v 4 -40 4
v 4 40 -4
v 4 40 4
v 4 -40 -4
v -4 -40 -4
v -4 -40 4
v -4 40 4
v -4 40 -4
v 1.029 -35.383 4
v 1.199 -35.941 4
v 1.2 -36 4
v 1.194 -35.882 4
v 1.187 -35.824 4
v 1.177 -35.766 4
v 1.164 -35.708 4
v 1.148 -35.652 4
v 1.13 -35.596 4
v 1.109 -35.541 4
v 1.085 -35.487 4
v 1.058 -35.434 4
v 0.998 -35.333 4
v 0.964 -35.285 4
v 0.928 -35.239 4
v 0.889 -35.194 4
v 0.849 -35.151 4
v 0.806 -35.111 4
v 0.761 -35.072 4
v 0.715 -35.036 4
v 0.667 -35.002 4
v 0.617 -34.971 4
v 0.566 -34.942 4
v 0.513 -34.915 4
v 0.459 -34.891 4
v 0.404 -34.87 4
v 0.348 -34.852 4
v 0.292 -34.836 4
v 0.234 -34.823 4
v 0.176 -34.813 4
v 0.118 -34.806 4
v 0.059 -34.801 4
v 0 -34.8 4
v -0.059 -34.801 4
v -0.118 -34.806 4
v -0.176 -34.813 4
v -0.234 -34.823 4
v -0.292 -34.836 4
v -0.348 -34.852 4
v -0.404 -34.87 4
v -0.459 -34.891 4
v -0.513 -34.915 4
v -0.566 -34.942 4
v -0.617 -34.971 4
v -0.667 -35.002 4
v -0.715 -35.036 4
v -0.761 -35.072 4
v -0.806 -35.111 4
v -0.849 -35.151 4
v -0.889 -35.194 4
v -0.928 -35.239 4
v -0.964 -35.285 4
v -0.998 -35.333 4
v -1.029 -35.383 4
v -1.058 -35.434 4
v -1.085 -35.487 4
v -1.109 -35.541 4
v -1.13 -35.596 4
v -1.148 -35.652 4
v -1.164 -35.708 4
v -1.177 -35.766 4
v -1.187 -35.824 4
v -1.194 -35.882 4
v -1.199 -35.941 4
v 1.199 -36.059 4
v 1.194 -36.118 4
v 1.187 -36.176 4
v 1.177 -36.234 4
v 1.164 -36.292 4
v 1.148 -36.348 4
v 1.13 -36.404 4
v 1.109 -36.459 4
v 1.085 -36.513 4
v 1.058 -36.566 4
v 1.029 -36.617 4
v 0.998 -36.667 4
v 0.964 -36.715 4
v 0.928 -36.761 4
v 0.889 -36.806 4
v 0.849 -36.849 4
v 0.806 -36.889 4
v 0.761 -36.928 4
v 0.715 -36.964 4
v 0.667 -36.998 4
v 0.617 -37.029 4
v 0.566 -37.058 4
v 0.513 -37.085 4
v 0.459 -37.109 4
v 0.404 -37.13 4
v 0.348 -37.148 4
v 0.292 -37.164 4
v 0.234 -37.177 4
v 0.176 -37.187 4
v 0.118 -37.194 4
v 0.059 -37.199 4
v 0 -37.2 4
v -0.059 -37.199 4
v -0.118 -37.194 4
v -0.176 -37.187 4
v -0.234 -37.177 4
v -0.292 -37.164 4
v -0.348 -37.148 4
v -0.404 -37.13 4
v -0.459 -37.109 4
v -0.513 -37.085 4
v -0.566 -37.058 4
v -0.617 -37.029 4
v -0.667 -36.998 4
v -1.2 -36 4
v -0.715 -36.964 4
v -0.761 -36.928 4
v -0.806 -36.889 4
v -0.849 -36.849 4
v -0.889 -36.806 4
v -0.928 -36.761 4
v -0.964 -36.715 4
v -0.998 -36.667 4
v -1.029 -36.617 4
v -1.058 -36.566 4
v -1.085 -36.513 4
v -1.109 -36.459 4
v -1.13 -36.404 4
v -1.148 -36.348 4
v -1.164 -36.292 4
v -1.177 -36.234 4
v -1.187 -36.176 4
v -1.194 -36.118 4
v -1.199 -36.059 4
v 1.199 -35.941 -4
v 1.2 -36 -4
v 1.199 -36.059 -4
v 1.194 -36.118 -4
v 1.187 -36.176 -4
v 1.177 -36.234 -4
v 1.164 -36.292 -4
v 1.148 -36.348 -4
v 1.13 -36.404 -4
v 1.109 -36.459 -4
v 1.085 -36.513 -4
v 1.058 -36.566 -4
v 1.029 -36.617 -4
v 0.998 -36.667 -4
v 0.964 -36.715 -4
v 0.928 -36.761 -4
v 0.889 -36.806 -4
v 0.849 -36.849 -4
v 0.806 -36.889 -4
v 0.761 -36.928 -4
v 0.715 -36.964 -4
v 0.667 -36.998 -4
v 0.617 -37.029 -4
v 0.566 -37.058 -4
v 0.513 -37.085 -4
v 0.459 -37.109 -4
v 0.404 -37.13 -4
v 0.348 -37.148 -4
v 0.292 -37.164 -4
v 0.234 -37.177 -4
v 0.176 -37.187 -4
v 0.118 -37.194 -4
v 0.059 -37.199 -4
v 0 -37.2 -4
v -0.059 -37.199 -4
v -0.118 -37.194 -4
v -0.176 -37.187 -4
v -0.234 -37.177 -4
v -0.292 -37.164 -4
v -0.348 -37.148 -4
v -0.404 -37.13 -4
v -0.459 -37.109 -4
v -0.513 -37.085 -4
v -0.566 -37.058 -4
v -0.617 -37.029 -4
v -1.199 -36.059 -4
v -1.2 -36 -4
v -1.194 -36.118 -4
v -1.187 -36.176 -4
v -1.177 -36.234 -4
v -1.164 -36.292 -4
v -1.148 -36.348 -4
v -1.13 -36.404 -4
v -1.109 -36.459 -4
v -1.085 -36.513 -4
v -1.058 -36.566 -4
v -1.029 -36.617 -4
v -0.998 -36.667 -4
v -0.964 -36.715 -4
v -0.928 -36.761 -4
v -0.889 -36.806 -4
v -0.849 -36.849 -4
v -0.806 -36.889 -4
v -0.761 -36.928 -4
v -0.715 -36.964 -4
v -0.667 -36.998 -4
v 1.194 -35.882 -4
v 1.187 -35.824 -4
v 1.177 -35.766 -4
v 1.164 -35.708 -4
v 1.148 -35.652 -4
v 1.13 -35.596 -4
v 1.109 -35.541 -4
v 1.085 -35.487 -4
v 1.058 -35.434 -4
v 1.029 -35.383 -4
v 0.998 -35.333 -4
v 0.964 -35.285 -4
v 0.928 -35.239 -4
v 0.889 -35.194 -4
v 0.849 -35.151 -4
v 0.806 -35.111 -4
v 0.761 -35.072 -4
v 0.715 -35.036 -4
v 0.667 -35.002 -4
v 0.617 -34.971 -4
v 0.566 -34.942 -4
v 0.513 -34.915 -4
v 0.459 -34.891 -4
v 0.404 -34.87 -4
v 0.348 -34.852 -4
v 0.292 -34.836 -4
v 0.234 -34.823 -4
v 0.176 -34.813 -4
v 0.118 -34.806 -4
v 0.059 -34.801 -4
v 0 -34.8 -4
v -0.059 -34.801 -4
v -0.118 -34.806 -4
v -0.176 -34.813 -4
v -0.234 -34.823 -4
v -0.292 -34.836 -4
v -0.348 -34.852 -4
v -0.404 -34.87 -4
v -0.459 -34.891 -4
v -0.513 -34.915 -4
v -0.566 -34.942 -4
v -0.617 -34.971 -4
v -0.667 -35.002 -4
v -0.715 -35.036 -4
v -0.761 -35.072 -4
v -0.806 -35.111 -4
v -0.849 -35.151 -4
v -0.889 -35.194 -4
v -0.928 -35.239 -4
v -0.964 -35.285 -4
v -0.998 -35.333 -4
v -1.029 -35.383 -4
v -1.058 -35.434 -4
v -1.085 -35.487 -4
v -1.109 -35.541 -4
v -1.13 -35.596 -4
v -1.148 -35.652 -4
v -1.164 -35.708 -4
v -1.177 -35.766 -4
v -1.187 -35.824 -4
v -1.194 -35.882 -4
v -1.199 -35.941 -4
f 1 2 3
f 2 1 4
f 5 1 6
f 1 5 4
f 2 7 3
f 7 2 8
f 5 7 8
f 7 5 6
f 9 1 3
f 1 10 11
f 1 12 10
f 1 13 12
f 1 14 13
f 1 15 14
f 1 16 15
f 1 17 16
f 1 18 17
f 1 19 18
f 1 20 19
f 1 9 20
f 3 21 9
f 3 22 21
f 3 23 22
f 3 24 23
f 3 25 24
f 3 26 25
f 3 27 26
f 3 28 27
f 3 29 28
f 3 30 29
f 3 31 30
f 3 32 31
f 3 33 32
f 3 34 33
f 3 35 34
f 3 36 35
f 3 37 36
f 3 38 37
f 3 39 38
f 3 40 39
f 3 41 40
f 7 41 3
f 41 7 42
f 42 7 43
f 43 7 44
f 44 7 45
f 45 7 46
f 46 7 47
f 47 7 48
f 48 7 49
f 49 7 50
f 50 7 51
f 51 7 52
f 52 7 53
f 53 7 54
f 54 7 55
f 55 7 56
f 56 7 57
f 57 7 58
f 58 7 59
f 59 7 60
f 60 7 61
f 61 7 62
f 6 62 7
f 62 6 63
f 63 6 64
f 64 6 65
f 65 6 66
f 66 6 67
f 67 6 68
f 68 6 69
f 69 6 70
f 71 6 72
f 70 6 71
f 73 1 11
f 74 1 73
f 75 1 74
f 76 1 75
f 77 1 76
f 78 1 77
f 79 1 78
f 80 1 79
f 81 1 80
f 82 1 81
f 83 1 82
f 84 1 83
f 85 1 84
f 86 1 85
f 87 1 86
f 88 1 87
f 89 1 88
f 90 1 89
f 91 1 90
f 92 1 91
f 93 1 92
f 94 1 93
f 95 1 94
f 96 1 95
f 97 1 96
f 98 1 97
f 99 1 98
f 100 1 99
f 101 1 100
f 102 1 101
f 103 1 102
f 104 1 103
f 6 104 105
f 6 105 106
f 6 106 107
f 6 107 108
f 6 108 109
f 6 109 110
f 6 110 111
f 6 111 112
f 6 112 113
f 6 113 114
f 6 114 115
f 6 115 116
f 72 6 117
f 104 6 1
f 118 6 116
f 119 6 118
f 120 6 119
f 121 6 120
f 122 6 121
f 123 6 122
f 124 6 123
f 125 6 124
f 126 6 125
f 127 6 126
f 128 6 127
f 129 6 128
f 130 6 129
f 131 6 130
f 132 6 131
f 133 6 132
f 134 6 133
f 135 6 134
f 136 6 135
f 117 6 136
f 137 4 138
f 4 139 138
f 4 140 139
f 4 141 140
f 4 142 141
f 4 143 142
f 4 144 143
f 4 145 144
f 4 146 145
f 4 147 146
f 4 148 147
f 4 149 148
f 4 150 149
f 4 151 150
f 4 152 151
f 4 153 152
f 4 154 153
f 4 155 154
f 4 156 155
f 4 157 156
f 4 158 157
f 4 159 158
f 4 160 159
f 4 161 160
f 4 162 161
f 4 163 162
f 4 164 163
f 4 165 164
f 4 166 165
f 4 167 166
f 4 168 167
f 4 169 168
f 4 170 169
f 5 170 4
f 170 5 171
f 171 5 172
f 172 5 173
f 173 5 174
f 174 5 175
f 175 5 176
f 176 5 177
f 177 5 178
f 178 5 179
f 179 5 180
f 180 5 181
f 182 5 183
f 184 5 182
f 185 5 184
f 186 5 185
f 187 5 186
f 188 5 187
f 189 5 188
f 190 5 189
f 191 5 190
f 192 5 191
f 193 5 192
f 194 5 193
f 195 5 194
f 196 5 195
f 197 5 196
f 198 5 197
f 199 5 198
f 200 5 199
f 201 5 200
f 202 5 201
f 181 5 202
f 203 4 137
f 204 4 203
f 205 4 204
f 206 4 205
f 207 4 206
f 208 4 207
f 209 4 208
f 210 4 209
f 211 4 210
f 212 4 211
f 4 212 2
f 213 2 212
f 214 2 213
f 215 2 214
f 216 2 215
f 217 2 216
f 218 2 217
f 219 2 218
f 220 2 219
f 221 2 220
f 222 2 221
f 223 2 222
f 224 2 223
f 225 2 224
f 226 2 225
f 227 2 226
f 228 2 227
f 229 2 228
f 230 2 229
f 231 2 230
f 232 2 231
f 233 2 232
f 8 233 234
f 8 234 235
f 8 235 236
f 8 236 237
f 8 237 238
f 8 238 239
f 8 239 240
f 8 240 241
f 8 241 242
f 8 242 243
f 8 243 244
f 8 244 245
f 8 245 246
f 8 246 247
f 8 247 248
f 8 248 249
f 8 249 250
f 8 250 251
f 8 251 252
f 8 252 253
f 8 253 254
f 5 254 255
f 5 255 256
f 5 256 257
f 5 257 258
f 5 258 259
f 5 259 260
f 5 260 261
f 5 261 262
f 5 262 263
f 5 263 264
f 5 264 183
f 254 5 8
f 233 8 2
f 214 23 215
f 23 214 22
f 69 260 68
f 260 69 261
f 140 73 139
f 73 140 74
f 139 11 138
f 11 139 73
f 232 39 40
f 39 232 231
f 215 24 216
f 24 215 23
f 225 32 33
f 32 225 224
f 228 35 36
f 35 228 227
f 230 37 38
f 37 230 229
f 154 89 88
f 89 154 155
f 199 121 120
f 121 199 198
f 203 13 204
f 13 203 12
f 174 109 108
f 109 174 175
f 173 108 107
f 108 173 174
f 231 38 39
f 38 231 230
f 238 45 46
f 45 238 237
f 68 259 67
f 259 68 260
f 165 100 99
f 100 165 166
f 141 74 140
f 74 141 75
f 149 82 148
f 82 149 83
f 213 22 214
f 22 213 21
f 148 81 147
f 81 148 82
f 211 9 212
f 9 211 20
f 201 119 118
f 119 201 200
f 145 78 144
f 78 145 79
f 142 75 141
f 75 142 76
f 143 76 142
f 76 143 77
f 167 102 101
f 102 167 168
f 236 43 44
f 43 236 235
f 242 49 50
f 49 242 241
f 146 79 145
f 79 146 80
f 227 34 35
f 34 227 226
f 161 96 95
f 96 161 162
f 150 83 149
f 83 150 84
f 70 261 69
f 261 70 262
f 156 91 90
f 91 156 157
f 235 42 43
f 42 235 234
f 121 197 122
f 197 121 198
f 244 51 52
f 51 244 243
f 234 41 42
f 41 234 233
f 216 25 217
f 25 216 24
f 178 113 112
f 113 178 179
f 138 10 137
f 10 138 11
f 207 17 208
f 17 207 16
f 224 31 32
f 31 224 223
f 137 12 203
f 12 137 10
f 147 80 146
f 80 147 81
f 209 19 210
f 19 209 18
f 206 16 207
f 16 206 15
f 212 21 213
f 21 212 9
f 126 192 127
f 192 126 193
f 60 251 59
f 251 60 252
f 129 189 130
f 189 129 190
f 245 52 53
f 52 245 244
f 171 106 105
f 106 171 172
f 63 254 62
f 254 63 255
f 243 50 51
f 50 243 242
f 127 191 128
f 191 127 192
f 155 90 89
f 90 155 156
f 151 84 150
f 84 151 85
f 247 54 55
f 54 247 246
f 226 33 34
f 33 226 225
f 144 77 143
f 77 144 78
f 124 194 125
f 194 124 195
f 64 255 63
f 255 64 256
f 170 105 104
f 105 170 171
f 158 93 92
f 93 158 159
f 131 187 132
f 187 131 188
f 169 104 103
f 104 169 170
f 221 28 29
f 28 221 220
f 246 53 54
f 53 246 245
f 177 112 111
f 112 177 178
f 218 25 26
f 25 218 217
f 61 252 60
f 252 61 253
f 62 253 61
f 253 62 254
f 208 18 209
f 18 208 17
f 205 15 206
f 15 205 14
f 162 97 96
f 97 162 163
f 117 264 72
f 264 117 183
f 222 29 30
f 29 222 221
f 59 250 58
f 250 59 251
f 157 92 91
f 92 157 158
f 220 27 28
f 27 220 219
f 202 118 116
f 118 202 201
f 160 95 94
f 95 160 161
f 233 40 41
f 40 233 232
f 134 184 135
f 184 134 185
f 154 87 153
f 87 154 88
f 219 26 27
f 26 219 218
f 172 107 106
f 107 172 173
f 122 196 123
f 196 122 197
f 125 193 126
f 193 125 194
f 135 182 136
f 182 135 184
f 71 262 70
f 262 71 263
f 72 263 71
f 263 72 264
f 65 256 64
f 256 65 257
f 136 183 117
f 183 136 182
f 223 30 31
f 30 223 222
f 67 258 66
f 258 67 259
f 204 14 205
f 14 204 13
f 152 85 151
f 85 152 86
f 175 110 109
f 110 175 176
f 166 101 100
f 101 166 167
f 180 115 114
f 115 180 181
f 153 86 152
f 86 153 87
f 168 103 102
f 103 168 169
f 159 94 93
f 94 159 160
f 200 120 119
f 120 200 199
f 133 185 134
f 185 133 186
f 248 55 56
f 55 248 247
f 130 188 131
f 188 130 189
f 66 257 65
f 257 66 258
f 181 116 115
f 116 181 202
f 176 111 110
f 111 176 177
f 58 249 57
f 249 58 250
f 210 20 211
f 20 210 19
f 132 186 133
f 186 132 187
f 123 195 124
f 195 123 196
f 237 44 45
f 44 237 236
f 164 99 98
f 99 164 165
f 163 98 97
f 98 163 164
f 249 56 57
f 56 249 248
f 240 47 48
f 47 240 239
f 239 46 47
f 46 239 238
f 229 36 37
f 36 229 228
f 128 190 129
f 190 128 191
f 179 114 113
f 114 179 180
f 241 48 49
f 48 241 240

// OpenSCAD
width = 8;
length = 80;
margin = width/2;
hole_radius = 1.2;
fn = 128;

module render()
{
  rotate(a=90, v=[1,0,0])
  difference() {
    cube(size = [width ,width , length], center = true);
    union() {
      translate([0, 0, length/2 - margin])
      rotate(a=90, v=[1,0,0])
      cylinder(h=width+2,
               r1=hole_radius,
               r2=hole_radius, $fn=fn, center = true);
    }
  }
}

echo(version=version());

render();
